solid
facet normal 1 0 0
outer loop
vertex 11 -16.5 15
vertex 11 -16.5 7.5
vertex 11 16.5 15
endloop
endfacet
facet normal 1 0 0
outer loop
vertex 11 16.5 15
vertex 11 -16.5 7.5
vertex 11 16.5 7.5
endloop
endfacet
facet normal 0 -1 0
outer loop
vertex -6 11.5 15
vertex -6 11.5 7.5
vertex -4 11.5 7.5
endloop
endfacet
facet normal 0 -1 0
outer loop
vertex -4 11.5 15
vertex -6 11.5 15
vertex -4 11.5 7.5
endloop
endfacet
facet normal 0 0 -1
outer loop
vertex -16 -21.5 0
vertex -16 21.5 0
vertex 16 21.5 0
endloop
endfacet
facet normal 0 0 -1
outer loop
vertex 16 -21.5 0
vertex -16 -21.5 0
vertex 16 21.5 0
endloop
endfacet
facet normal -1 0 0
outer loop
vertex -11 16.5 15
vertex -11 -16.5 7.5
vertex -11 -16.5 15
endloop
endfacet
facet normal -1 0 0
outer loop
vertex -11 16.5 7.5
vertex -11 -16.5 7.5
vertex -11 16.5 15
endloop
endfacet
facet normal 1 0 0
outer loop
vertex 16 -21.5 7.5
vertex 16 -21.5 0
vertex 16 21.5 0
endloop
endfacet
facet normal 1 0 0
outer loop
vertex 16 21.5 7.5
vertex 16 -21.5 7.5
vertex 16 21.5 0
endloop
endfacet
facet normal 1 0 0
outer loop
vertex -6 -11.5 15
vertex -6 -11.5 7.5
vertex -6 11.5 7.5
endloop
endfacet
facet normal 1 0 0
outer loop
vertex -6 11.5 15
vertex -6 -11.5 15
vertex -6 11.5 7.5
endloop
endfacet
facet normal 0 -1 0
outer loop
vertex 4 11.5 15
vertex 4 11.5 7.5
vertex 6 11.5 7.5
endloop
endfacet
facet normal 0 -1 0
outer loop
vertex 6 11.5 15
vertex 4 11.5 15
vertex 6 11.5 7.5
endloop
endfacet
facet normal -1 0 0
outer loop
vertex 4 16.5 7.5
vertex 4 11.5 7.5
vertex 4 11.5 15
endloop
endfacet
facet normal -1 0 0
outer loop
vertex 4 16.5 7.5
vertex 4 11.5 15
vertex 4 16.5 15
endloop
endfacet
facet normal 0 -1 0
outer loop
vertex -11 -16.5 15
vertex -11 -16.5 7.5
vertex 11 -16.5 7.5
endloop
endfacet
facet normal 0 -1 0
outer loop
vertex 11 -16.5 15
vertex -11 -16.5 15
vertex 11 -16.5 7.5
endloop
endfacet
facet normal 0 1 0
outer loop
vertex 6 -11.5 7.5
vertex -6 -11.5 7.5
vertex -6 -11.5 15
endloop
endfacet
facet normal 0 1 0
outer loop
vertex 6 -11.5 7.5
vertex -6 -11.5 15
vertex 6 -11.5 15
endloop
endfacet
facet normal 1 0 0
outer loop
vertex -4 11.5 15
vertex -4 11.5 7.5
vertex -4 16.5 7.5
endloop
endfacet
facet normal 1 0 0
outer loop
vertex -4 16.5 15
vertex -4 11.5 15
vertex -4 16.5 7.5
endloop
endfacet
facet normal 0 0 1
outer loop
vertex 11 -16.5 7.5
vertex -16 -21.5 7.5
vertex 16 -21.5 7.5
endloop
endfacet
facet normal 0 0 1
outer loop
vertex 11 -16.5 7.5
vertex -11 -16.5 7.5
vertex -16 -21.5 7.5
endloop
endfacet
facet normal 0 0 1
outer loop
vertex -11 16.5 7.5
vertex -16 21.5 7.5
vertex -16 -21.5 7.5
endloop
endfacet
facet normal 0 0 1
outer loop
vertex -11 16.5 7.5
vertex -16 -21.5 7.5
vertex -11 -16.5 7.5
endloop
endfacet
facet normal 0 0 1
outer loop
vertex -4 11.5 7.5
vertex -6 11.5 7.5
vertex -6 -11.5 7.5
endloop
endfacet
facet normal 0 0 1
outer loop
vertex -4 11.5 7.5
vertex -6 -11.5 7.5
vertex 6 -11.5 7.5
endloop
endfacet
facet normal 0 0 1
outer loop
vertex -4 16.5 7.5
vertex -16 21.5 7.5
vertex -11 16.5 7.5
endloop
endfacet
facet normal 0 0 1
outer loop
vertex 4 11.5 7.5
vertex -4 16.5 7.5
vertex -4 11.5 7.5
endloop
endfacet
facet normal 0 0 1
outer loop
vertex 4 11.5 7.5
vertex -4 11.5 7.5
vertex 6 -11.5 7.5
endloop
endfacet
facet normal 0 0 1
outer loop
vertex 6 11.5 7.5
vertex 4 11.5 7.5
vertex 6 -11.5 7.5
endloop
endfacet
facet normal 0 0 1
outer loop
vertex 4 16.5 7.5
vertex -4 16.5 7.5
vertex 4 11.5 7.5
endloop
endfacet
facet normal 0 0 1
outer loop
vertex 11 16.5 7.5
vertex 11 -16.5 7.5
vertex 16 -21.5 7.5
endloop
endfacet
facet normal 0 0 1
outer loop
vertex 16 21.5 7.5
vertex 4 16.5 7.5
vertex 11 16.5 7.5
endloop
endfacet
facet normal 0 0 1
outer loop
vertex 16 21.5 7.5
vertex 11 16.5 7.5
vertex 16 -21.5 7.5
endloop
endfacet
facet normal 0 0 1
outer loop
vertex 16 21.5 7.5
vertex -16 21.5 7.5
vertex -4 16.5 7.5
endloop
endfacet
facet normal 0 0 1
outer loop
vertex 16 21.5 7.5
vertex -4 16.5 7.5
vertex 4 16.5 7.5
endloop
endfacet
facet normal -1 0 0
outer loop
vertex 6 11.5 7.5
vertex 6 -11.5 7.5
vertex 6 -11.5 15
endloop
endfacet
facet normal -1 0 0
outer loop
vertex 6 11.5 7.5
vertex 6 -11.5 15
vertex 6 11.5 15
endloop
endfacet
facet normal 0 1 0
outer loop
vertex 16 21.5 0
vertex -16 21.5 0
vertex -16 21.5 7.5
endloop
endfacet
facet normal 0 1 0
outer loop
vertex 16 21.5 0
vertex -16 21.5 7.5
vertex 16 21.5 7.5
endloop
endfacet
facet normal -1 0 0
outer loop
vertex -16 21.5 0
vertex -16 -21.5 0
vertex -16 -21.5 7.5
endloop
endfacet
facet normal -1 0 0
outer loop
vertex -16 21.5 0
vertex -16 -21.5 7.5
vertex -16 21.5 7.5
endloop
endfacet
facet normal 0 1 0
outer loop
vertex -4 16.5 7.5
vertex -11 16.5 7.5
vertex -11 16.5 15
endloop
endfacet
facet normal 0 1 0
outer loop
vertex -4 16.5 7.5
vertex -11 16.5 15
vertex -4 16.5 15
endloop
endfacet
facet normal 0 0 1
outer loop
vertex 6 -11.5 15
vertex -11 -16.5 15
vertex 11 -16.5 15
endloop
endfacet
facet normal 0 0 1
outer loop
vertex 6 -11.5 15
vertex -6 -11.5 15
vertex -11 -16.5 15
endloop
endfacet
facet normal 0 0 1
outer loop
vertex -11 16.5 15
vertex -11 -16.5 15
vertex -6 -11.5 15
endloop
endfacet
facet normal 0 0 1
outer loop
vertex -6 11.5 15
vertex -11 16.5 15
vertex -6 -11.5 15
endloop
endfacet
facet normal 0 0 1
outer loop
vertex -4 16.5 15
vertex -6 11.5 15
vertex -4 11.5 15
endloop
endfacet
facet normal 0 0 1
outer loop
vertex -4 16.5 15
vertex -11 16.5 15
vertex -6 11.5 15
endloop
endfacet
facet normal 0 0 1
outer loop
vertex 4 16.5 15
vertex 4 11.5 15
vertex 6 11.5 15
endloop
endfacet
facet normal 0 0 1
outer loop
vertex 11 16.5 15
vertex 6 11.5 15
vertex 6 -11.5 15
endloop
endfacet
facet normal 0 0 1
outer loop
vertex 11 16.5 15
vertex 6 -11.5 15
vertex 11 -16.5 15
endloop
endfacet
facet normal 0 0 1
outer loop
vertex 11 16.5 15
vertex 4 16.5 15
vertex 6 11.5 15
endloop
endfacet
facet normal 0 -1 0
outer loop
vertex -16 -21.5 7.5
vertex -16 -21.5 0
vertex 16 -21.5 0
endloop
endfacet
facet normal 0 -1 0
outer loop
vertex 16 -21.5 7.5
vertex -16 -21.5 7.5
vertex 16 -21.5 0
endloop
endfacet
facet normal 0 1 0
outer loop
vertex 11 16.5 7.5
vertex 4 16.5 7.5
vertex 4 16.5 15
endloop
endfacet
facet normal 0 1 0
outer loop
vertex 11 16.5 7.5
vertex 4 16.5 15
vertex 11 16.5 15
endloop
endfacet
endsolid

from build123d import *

# Parameters (mm, degrees)
BOX_W        = 8
BOX_H        = 10
BOX_DEPTH    = 7.5
SKETCH001_W  = 32
SKETCH001_H  = 43
PAD001_DEPTH = 7.5
SKETCH_W     = 22
SKETCH_H     = 33
SKETCH_W_2   = 12
SKETCH_H_2   = 23
PAD_DEPTH    = 15


with BuildPart() as cube:
    # Box → Box (new body)
    with BuildSketch(Plane(origin=(-4, 8, 7.5), x_dir=(1, 0, 0), z_dir=(0, 0, 1))):
        with Locations((4, 5)):
            Rectangle(BOX_W, BOX_H)
    extrude(amount=BOX_DEPTH)


with BuildPart() as body001:
    # Sketch001 → Pad001 (new body)
    with BuildSketch(Plane.XY):
        Rectangle(SKETCH001_W, SKETCH001_H)
    extrude(amount=PAD001_DEPTH)


with BuildPart() as cut:
    # Sketch → Pad (new body)
    with BuildSketch(Plane.XY):
        Rectangle(SKETCH_W, SKETCH_H)
        Rectangle(SKETCH_W_2, SKETCH_H_2, mode=Mode.SUBTRACT)
    extrude(amount=PAD_DEPTH)

    # Fusion: union Body001
    add(body001.part)

    # Cut: cut Cube
    add(cube.part, mode=Mode.SUBTRACT)


solid = cut.part
